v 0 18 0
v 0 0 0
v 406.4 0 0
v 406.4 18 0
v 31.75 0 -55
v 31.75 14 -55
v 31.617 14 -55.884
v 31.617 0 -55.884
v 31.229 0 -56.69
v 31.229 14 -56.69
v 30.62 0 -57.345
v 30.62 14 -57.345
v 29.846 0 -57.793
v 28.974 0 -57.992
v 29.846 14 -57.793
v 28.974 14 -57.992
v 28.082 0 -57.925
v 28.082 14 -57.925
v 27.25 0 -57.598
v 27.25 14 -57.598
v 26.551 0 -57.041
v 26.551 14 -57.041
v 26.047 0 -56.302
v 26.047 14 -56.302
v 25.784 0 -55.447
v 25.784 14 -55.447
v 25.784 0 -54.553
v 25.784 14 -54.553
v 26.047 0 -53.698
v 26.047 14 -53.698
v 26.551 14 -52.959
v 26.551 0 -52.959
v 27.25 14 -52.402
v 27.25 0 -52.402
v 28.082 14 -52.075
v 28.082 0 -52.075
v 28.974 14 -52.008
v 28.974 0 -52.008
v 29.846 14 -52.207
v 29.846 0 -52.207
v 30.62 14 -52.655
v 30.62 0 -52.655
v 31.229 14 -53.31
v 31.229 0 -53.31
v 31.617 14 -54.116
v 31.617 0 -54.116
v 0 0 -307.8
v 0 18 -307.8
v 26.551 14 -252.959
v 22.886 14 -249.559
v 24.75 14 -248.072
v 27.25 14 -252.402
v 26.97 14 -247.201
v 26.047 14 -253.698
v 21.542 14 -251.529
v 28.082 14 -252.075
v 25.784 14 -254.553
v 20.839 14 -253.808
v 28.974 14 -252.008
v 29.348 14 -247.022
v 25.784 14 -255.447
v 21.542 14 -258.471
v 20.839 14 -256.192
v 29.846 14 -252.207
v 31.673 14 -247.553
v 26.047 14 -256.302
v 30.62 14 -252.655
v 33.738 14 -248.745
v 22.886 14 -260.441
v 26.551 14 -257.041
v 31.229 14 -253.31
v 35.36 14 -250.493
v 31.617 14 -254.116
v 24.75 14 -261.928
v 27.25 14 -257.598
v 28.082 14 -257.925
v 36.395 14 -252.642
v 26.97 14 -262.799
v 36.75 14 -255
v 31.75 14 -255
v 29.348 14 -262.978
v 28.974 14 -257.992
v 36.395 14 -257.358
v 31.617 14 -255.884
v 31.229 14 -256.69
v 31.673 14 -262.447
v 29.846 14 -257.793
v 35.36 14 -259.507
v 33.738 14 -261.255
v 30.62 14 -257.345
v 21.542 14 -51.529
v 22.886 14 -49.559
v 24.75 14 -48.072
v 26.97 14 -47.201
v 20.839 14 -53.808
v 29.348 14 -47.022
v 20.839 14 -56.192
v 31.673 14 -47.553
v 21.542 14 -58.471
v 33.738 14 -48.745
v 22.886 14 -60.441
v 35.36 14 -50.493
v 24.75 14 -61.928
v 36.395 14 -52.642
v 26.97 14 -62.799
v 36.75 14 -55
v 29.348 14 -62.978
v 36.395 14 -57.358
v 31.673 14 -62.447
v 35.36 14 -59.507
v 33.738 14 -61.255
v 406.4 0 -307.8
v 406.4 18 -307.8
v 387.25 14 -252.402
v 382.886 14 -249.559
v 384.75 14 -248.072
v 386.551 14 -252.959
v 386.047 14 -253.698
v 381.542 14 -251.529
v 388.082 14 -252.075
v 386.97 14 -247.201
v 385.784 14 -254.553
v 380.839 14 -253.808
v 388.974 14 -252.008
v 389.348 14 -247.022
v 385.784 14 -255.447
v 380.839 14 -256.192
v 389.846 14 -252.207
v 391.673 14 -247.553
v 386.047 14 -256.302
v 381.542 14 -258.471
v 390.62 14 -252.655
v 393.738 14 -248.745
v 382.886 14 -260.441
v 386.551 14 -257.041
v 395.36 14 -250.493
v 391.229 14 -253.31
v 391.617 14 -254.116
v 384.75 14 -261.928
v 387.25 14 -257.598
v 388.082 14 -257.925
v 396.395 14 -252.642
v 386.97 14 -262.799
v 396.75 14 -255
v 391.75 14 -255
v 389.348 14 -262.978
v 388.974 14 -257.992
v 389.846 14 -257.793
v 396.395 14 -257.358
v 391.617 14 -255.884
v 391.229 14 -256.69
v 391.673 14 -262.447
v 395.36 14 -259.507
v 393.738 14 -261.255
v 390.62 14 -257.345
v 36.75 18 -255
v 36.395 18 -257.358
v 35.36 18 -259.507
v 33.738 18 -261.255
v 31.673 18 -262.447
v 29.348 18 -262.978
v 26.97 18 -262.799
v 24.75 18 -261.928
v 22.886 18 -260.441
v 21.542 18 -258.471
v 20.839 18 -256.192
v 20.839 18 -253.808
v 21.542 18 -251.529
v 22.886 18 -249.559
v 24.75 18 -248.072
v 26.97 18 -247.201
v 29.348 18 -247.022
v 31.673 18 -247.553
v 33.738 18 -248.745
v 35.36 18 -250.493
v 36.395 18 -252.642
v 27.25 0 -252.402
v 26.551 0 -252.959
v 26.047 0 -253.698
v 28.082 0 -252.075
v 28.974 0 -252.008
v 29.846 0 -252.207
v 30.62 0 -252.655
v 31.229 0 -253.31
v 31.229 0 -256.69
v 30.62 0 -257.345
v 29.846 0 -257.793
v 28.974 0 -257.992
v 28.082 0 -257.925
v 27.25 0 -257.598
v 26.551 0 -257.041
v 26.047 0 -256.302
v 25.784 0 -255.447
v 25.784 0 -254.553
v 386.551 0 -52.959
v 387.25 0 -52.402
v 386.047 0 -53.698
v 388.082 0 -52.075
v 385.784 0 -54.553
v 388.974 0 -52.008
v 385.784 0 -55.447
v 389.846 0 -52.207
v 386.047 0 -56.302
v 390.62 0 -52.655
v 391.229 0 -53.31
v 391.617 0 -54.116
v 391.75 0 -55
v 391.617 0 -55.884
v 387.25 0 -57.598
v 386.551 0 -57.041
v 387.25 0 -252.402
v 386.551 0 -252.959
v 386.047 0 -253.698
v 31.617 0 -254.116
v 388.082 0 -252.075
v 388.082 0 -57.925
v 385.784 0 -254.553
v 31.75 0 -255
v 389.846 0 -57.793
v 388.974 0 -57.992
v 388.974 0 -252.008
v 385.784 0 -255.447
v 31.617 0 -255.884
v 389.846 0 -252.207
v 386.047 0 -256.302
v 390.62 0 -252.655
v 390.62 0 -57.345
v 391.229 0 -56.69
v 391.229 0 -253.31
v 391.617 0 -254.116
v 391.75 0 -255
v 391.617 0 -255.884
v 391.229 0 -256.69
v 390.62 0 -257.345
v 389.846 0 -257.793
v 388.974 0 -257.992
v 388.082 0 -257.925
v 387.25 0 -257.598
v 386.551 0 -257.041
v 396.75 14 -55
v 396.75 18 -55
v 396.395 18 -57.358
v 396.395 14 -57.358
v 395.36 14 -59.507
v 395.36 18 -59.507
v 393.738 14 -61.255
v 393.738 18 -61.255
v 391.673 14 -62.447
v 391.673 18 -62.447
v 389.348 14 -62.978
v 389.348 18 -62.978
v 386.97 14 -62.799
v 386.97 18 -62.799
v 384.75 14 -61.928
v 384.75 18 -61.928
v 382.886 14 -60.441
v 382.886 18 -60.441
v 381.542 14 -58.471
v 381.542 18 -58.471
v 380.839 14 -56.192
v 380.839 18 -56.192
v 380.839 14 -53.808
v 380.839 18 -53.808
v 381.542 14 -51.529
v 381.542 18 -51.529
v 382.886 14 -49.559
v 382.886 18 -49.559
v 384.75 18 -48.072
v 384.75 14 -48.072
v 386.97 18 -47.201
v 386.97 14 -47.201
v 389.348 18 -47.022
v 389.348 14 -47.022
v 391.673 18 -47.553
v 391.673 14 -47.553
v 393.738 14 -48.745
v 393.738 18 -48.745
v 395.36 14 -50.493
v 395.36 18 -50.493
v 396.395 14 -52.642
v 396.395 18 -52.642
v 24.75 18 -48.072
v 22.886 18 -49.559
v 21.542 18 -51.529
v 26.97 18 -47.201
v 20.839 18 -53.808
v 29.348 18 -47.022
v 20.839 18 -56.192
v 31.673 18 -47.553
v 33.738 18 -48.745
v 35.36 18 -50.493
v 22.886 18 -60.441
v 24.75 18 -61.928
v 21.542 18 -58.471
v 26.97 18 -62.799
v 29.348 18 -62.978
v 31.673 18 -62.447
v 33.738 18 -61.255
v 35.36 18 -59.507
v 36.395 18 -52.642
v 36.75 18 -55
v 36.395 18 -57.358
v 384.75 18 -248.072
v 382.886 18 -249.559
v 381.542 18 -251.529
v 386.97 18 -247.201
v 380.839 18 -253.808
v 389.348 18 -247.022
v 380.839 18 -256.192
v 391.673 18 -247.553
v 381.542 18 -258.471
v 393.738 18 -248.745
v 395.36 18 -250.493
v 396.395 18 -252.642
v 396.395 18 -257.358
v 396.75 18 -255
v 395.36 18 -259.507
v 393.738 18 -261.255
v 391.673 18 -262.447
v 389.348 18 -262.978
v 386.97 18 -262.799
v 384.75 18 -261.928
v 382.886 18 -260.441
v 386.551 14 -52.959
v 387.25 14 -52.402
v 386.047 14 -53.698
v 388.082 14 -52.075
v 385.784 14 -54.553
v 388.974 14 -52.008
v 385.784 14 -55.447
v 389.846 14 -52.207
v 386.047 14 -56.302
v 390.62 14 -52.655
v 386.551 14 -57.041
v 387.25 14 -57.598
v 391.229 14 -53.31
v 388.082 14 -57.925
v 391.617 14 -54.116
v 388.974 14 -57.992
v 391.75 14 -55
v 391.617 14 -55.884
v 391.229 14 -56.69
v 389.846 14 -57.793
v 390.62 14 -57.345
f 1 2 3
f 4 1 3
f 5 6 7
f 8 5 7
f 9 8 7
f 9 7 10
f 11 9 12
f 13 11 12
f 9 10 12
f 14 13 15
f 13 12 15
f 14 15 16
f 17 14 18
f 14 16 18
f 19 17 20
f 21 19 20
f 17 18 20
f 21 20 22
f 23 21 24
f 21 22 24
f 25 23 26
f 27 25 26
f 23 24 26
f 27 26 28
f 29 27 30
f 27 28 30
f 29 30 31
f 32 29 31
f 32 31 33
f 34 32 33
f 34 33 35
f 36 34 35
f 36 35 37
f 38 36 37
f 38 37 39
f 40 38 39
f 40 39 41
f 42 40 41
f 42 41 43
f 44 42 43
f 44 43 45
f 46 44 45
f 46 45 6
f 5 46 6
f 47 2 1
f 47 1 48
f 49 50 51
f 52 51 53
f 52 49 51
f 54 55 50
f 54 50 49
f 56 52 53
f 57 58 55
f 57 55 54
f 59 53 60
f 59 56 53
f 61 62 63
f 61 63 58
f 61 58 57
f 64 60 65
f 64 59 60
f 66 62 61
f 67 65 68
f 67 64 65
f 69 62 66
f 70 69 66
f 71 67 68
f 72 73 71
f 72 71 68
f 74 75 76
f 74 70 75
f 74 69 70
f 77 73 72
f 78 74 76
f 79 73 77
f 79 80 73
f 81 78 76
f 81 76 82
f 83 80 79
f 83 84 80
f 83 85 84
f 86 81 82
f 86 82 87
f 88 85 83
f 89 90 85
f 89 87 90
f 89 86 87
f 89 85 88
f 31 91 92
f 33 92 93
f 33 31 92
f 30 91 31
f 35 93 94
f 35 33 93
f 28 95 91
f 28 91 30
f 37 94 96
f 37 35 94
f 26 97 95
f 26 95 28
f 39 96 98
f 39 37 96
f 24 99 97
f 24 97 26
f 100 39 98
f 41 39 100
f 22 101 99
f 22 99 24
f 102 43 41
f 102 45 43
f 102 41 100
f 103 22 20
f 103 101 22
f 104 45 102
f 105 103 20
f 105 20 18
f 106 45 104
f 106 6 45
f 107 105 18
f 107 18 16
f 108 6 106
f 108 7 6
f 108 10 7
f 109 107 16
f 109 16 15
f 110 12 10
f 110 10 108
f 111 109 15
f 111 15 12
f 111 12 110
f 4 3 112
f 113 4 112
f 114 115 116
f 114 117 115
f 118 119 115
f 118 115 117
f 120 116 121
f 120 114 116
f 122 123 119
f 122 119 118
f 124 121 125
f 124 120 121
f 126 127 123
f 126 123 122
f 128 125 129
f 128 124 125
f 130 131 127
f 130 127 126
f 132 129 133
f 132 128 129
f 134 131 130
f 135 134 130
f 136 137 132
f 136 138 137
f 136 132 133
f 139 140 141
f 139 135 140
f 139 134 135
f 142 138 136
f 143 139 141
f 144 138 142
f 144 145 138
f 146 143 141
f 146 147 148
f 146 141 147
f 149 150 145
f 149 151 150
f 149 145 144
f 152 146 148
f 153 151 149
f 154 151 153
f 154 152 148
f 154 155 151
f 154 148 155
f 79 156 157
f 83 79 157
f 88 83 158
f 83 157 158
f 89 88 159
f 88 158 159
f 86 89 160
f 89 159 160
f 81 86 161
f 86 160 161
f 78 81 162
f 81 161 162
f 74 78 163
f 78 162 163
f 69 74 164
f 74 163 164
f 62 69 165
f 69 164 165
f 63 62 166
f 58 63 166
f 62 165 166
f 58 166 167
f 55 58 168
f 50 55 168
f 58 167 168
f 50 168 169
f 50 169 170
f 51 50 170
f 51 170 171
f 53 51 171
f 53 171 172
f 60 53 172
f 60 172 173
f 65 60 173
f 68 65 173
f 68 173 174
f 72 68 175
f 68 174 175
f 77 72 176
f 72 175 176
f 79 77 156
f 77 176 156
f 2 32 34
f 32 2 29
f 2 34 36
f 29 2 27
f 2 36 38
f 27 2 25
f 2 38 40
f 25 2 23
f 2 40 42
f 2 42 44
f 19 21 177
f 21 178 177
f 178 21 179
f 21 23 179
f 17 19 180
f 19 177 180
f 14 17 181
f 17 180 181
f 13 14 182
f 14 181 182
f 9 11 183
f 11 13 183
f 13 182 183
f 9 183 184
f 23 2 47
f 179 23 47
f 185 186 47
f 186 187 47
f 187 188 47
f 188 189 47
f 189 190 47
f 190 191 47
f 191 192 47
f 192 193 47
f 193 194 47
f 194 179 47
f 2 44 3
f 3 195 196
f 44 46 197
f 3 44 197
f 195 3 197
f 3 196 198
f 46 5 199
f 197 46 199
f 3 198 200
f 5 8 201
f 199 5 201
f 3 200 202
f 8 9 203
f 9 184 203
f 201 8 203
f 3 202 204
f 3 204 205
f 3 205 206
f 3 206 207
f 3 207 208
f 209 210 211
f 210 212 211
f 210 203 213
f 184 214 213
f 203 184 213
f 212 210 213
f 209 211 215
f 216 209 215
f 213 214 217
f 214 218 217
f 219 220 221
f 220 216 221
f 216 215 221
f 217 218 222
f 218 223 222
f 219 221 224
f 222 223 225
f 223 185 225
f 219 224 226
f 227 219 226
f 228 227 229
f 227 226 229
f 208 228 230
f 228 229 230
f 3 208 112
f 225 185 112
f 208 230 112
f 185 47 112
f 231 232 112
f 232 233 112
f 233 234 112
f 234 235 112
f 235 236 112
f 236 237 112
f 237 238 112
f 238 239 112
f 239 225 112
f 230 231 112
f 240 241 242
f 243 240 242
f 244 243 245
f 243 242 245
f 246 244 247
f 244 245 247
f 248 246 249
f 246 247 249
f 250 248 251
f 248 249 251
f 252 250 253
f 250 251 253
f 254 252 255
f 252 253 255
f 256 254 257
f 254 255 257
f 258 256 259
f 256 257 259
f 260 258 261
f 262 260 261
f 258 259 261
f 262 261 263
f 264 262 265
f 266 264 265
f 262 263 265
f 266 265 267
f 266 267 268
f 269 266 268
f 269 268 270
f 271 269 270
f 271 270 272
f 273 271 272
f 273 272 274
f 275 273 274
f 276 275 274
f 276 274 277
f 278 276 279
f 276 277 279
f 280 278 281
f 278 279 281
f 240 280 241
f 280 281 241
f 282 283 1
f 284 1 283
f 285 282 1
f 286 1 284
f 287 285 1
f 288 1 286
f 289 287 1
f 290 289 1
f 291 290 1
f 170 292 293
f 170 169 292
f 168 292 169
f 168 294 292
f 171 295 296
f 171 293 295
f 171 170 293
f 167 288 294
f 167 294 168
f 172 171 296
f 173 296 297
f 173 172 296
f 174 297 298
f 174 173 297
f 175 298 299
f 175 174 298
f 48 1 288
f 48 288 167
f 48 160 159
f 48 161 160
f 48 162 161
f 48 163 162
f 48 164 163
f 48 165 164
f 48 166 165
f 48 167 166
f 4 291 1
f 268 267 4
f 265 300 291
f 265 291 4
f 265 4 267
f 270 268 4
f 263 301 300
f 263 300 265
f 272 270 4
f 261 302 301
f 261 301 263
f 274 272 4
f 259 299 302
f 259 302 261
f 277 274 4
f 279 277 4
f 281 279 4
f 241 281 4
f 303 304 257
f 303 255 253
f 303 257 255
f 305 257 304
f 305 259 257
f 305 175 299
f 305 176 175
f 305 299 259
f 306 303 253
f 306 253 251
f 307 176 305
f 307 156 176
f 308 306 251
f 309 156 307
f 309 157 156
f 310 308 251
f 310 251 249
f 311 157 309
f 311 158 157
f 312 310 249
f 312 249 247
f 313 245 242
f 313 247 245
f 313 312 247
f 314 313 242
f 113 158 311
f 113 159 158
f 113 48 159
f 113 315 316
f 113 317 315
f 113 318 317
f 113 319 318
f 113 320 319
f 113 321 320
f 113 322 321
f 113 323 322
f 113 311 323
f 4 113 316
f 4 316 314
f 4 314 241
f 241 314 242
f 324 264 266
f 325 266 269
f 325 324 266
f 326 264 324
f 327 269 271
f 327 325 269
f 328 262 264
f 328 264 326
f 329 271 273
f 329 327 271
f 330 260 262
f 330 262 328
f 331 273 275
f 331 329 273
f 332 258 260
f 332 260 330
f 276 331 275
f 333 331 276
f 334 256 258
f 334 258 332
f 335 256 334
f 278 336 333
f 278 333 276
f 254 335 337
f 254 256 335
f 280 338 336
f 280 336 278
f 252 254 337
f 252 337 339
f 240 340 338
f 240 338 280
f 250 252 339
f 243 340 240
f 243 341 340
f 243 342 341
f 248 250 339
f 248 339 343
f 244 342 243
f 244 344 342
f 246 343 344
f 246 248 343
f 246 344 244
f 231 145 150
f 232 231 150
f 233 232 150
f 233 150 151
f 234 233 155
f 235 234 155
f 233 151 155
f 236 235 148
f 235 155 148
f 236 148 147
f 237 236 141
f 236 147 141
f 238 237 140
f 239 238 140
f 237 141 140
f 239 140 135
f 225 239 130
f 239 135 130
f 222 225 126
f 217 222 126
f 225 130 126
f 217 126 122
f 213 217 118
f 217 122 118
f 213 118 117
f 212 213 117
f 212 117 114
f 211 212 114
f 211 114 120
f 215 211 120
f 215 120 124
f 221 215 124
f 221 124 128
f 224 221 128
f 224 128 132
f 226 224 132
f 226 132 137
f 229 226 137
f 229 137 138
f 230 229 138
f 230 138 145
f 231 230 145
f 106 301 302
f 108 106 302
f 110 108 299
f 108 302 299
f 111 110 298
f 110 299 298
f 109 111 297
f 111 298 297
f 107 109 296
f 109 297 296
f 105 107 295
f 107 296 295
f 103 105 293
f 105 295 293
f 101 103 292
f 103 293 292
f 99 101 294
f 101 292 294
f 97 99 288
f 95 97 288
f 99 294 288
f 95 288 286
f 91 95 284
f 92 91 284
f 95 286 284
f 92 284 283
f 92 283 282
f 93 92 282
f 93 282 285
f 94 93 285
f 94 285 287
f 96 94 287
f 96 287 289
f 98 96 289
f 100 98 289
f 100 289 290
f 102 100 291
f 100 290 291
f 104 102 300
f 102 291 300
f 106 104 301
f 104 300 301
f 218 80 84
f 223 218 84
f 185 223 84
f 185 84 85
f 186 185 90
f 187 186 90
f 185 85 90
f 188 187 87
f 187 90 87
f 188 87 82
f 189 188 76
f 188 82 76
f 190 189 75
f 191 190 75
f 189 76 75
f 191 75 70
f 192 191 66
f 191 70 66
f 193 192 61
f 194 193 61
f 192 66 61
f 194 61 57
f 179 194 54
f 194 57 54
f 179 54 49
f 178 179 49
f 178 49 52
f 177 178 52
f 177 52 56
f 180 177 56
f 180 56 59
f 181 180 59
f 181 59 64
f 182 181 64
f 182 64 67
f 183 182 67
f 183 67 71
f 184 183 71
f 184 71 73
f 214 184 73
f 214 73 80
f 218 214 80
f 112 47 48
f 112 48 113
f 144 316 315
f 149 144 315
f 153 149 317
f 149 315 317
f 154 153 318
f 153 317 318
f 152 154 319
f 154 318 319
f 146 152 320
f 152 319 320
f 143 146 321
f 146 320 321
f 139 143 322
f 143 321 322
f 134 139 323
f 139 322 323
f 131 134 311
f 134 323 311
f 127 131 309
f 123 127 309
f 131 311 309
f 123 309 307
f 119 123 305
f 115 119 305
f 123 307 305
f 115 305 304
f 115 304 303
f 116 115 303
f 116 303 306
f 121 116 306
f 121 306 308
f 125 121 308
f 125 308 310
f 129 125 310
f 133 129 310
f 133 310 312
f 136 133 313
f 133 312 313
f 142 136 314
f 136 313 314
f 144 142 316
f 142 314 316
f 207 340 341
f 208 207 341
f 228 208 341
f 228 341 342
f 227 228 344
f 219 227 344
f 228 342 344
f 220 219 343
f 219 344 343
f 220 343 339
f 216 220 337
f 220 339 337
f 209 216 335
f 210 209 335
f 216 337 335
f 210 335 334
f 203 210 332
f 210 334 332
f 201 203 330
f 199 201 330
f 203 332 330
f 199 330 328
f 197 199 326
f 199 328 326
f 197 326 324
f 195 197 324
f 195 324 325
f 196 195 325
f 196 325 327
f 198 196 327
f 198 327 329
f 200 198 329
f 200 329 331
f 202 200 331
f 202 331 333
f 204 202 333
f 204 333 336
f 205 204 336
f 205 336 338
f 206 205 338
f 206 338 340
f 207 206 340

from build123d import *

# Parameters (mm, degrees)
SKETCH1_W               = 406.4
SKETCH1_H               = 307.8
BOSS_EXTRUDE1_DEPTH     = 18
SKETCH2_R               = 8
CUT_EXTRUDE1_DEPTH      = 4
SKETCH3_R               = 3
CUT_EXTRUDE2_DEPTH      = 5
CUT_EXTRUDE2_DEPTH_BACK = 15


with BuildPart() as part:
    # Sketch1 → Boss-Extrude1 (new body)
    with BuildSketch(Plane(origin=(0, 0, 0), x_dir=(1, 0, 0), z_dir=(0, 1, 0))):
        with Locations((203.2, 153.9)):
            Rectangle(SKETCH1_W, SKETCH1_H)
    extrude(amount=BOSS_EXTRUDE1_DEPTH)

    # Sketch2 → Cut-Extrude1 (cut)
    with BuildSketch(Plane(origin=(0, 18, 0), x_dir=(1, 0, 0), z_dir=(0, 1, 0))):
        with Locations((28.75, 55)):
            Circle(SKETCH2_R)
        with Locations((388.75, 255)):
            Circle(SKETCH2_R)
        with Locations((388.75, 55)):
            Circle(SKETCH2_R)
        with Locations((28.75, 255)):
            Circle(SKETCH2_R)
    extrude(amount=-CUT_EXTRUDE1_DEPTH, mode=Mode.SUBTRACT)

    # Sketch3 → Cut-Extrude2 (cut, two sides)
    with BuildSketch(Plane(origin=(0, 14, 0), x_dir=(1, 0, 0), z_dir=(0, 1, 0))) as cut_extrude2_sk:
        with Locations((28.75, 255)):
            Circle(SKETCH3_R)
        with Locations((28.75, 55)):
            Circle(SKETCH3_R)
        with Locations((388.75, 55)):
            Circle(SKETCH3_R)
        with Locations((388.75, 255)):
            Circle(SKETCH3_R)
    extrude(amount=CUT_EXTRUDE2_DEPTH, mode=Mode.SUBTRACT)
    extrude(cut_extrude2_sk.sketch, amount=-CUT_EXTRUDE2_DEPTH_BACK, mode=Mode.SUBTRACT)


solid = part.part
